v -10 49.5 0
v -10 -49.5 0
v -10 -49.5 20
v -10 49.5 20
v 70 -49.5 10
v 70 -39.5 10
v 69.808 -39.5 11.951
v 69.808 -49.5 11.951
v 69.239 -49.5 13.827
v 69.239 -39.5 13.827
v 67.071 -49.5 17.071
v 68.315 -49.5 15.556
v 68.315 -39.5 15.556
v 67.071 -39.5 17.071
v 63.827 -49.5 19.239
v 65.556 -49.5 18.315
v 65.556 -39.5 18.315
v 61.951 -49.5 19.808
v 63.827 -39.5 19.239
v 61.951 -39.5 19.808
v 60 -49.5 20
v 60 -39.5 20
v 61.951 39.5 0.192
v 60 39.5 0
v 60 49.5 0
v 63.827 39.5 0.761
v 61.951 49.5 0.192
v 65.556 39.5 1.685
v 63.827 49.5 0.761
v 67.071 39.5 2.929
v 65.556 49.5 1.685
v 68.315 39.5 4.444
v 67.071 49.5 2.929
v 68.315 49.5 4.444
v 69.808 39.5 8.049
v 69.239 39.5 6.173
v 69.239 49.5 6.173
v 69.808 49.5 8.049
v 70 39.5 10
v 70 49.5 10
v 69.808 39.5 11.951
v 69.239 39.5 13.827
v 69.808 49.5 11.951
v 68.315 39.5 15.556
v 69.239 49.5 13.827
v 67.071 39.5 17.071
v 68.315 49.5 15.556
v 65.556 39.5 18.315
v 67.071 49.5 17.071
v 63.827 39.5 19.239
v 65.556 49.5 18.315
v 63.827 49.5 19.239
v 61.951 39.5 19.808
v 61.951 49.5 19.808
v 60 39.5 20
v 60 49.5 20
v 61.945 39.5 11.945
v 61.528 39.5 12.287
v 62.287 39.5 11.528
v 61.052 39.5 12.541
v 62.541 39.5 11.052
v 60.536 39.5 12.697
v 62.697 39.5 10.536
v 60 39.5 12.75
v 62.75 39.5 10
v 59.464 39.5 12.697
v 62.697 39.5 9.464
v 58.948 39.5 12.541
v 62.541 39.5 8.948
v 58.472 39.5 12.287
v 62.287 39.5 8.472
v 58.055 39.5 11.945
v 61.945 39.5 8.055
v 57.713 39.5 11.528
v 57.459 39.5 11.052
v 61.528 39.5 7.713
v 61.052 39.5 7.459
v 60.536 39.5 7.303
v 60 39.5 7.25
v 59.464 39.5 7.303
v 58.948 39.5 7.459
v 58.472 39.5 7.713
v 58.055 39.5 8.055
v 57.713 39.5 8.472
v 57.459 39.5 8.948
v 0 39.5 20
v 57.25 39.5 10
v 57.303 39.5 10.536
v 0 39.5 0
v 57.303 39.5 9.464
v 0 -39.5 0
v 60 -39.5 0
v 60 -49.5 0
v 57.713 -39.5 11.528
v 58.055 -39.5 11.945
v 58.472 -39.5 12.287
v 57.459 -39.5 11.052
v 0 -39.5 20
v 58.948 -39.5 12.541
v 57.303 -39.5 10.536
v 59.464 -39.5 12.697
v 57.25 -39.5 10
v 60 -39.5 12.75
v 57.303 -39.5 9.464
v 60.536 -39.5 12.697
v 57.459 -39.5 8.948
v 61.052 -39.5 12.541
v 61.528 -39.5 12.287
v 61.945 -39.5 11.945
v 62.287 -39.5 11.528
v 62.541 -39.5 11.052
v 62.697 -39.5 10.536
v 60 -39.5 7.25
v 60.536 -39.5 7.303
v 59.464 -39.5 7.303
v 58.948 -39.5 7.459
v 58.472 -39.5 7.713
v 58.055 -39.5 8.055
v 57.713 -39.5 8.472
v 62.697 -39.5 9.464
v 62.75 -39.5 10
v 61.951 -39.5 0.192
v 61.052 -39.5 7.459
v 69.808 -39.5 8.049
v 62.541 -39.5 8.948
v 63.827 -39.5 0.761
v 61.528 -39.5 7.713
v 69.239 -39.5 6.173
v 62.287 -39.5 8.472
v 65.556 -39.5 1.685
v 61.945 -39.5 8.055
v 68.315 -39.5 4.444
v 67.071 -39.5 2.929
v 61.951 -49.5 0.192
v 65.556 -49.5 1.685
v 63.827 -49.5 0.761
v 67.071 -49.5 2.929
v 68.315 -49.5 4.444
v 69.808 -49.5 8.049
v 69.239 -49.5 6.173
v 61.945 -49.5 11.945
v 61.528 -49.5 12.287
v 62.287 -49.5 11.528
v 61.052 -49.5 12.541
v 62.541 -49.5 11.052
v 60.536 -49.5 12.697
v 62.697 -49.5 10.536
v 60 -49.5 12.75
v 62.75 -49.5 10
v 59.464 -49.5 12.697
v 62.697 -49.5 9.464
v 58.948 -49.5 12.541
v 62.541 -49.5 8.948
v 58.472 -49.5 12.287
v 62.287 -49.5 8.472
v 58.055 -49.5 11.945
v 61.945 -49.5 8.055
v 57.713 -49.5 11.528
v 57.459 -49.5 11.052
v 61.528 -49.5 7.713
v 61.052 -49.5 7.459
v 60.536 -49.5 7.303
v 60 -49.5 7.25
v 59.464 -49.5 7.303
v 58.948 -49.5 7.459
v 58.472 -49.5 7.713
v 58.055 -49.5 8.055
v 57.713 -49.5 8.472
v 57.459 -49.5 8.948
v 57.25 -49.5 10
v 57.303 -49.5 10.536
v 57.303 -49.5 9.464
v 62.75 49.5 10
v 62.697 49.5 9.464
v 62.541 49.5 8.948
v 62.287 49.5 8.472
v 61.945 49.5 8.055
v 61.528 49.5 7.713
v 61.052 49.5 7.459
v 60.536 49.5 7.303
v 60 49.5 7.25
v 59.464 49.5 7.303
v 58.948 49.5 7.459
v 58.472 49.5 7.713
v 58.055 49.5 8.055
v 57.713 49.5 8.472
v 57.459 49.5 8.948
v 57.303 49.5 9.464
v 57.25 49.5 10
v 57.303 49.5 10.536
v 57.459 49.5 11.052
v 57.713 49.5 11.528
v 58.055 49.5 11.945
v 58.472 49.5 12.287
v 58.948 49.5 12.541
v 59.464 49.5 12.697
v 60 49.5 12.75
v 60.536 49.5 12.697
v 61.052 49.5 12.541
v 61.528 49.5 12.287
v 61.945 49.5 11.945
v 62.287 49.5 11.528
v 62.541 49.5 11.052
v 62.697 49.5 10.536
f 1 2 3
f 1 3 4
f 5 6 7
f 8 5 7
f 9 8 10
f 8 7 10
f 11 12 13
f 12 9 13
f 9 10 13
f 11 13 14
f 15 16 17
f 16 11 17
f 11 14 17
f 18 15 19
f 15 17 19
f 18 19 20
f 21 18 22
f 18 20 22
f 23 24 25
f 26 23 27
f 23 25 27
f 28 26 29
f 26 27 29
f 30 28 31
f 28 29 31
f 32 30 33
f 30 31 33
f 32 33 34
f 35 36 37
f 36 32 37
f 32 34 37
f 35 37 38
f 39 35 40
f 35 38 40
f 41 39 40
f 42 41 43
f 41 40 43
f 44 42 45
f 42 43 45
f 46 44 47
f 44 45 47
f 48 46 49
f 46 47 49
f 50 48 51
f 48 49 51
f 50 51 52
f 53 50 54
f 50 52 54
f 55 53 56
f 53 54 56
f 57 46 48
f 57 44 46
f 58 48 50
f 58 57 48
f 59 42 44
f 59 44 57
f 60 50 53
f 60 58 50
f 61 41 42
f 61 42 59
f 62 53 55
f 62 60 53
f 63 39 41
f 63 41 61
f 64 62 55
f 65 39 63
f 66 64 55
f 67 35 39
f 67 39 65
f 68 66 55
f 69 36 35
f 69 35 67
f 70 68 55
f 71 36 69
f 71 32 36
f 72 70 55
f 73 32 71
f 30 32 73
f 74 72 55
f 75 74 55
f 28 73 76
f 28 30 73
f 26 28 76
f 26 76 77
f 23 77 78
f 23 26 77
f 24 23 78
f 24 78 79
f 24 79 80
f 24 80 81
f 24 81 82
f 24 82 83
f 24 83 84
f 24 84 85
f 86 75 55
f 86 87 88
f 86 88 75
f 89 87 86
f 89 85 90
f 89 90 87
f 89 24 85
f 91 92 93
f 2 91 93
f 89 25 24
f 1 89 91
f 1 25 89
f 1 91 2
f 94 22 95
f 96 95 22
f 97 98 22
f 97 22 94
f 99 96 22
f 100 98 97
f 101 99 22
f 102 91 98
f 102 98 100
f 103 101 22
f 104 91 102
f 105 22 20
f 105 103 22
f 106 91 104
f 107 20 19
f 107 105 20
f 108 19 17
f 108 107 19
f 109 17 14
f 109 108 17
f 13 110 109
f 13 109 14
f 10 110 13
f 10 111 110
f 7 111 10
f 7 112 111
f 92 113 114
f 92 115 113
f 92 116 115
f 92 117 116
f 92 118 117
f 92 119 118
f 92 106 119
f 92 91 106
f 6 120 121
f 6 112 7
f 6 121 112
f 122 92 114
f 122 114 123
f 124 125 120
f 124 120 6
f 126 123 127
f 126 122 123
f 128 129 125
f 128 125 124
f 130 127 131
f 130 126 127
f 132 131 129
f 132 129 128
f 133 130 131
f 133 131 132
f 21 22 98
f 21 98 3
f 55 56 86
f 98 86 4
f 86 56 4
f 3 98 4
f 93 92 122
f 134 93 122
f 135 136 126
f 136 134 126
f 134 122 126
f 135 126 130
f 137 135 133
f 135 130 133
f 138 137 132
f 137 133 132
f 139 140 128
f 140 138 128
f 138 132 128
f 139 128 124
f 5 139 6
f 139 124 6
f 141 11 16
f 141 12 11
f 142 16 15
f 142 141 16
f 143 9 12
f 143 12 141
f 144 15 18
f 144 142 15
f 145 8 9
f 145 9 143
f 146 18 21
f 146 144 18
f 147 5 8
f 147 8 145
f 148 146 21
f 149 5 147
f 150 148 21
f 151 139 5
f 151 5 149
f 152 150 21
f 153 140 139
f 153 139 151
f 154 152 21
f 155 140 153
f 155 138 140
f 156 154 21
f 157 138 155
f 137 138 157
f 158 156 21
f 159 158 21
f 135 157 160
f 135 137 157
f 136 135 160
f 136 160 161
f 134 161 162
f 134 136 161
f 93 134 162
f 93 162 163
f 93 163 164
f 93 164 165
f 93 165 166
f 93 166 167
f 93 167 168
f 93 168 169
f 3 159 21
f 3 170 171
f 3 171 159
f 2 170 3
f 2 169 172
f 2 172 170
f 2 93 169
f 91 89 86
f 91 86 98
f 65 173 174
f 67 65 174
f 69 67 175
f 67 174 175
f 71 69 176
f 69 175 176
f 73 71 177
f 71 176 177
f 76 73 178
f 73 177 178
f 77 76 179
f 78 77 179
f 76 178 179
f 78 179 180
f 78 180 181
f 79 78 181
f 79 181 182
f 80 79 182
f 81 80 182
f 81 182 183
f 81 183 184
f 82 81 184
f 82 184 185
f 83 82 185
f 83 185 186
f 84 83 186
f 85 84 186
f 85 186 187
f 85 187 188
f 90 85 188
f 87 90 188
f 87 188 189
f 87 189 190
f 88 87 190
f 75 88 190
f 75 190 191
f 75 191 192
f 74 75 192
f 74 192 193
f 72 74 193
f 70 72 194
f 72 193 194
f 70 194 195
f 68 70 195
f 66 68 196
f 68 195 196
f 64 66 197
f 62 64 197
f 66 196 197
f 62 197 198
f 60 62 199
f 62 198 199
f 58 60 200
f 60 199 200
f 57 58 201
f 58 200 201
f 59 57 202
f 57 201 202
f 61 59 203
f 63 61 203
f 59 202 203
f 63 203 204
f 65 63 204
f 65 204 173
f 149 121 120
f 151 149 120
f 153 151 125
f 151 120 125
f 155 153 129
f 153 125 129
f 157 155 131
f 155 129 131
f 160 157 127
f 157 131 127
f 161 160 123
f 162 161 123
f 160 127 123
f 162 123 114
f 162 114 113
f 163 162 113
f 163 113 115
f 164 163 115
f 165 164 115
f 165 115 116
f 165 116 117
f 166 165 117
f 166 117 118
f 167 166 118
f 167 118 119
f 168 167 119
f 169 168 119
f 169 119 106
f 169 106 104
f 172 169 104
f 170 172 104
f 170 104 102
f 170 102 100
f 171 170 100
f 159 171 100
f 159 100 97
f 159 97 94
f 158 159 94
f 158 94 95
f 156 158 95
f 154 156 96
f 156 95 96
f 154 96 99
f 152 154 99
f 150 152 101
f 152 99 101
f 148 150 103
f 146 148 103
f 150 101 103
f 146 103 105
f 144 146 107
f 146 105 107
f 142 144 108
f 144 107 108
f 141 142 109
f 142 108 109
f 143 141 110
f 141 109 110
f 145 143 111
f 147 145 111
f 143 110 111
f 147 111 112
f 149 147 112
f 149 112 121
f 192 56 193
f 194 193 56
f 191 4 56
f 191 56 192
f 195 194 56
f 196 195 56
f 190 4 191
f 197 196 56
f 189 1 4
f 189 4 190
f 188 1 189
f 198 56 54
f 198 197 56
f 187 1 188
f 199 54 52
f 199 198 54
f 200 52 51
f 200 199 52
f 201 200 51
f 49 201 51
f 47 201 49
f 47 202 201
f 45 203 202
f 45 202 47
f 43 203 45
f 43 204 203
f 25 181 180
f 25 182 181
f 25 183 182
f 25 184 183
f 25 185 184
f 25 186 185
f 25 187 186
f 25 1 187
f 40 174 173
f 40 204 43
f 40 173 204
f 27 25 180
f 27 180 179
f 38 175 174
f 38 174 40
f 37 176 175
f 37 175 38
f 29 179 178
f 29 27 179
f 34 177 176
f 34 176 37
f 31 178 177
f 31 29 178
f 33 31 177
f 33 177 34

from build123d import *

# Parameters (mm, degrees)
EXTRUDE_1_DEPTH     = 20
CUT_EXTRUDE_1_DEPTH = 123.886126149


with BuildPart() as part:
    # 草图1 → 凸台-拉伸1 (new body)
    with BuildSketch(Plane.XY):
        Polygon((0, 39.5), (0, -39.5), (70, -39.5), (70, -49.5), (-10, -49.5), (-10, 49.5), (70, 49.5), (70, 39.5), align=None)
    extrude(amount=EXTRUDE_1_DEPTH)

    # 草图2 → 切除-拉伸1 (cut, through all)
    with BuildSketch(Plane(origin=(0, 49.5, 0), x_dir=(1, 0, 0), z_dir=(0, 1, 0))):
        with BuildLine():
            ThreePointArc((57.25, -10), (60, -12.75), (62.75, -10))
            Line((62.75, -10), (57.25, -10))
        make_face()
        with BuildLine():
            Line((57.25, -10), (62.75, -10))
            ThreePointArc((62.75, -10), (60, -7.25), (57.25, -10))
        make_face()
        with BuildLine():
            ThreePointArc((60, 0), (67.071067812, -2.928932188), (70, -10))
            Line((70, -10), (70, 0))
            Line((70, 0), (60, 0))
        make_face()
        with BuildLine():
            Line((70, -20), (70, -10))
            ThreePointArc((70, -10), (67.071067812, -17.071067812), (60, -20))
            Line((60, -20), (70, -20))
        make_face()
    extrude(amount=-CUT_EXTRUDE_1_DEPTH, mode=Mode.SUBTRACT)


solid = part.part
